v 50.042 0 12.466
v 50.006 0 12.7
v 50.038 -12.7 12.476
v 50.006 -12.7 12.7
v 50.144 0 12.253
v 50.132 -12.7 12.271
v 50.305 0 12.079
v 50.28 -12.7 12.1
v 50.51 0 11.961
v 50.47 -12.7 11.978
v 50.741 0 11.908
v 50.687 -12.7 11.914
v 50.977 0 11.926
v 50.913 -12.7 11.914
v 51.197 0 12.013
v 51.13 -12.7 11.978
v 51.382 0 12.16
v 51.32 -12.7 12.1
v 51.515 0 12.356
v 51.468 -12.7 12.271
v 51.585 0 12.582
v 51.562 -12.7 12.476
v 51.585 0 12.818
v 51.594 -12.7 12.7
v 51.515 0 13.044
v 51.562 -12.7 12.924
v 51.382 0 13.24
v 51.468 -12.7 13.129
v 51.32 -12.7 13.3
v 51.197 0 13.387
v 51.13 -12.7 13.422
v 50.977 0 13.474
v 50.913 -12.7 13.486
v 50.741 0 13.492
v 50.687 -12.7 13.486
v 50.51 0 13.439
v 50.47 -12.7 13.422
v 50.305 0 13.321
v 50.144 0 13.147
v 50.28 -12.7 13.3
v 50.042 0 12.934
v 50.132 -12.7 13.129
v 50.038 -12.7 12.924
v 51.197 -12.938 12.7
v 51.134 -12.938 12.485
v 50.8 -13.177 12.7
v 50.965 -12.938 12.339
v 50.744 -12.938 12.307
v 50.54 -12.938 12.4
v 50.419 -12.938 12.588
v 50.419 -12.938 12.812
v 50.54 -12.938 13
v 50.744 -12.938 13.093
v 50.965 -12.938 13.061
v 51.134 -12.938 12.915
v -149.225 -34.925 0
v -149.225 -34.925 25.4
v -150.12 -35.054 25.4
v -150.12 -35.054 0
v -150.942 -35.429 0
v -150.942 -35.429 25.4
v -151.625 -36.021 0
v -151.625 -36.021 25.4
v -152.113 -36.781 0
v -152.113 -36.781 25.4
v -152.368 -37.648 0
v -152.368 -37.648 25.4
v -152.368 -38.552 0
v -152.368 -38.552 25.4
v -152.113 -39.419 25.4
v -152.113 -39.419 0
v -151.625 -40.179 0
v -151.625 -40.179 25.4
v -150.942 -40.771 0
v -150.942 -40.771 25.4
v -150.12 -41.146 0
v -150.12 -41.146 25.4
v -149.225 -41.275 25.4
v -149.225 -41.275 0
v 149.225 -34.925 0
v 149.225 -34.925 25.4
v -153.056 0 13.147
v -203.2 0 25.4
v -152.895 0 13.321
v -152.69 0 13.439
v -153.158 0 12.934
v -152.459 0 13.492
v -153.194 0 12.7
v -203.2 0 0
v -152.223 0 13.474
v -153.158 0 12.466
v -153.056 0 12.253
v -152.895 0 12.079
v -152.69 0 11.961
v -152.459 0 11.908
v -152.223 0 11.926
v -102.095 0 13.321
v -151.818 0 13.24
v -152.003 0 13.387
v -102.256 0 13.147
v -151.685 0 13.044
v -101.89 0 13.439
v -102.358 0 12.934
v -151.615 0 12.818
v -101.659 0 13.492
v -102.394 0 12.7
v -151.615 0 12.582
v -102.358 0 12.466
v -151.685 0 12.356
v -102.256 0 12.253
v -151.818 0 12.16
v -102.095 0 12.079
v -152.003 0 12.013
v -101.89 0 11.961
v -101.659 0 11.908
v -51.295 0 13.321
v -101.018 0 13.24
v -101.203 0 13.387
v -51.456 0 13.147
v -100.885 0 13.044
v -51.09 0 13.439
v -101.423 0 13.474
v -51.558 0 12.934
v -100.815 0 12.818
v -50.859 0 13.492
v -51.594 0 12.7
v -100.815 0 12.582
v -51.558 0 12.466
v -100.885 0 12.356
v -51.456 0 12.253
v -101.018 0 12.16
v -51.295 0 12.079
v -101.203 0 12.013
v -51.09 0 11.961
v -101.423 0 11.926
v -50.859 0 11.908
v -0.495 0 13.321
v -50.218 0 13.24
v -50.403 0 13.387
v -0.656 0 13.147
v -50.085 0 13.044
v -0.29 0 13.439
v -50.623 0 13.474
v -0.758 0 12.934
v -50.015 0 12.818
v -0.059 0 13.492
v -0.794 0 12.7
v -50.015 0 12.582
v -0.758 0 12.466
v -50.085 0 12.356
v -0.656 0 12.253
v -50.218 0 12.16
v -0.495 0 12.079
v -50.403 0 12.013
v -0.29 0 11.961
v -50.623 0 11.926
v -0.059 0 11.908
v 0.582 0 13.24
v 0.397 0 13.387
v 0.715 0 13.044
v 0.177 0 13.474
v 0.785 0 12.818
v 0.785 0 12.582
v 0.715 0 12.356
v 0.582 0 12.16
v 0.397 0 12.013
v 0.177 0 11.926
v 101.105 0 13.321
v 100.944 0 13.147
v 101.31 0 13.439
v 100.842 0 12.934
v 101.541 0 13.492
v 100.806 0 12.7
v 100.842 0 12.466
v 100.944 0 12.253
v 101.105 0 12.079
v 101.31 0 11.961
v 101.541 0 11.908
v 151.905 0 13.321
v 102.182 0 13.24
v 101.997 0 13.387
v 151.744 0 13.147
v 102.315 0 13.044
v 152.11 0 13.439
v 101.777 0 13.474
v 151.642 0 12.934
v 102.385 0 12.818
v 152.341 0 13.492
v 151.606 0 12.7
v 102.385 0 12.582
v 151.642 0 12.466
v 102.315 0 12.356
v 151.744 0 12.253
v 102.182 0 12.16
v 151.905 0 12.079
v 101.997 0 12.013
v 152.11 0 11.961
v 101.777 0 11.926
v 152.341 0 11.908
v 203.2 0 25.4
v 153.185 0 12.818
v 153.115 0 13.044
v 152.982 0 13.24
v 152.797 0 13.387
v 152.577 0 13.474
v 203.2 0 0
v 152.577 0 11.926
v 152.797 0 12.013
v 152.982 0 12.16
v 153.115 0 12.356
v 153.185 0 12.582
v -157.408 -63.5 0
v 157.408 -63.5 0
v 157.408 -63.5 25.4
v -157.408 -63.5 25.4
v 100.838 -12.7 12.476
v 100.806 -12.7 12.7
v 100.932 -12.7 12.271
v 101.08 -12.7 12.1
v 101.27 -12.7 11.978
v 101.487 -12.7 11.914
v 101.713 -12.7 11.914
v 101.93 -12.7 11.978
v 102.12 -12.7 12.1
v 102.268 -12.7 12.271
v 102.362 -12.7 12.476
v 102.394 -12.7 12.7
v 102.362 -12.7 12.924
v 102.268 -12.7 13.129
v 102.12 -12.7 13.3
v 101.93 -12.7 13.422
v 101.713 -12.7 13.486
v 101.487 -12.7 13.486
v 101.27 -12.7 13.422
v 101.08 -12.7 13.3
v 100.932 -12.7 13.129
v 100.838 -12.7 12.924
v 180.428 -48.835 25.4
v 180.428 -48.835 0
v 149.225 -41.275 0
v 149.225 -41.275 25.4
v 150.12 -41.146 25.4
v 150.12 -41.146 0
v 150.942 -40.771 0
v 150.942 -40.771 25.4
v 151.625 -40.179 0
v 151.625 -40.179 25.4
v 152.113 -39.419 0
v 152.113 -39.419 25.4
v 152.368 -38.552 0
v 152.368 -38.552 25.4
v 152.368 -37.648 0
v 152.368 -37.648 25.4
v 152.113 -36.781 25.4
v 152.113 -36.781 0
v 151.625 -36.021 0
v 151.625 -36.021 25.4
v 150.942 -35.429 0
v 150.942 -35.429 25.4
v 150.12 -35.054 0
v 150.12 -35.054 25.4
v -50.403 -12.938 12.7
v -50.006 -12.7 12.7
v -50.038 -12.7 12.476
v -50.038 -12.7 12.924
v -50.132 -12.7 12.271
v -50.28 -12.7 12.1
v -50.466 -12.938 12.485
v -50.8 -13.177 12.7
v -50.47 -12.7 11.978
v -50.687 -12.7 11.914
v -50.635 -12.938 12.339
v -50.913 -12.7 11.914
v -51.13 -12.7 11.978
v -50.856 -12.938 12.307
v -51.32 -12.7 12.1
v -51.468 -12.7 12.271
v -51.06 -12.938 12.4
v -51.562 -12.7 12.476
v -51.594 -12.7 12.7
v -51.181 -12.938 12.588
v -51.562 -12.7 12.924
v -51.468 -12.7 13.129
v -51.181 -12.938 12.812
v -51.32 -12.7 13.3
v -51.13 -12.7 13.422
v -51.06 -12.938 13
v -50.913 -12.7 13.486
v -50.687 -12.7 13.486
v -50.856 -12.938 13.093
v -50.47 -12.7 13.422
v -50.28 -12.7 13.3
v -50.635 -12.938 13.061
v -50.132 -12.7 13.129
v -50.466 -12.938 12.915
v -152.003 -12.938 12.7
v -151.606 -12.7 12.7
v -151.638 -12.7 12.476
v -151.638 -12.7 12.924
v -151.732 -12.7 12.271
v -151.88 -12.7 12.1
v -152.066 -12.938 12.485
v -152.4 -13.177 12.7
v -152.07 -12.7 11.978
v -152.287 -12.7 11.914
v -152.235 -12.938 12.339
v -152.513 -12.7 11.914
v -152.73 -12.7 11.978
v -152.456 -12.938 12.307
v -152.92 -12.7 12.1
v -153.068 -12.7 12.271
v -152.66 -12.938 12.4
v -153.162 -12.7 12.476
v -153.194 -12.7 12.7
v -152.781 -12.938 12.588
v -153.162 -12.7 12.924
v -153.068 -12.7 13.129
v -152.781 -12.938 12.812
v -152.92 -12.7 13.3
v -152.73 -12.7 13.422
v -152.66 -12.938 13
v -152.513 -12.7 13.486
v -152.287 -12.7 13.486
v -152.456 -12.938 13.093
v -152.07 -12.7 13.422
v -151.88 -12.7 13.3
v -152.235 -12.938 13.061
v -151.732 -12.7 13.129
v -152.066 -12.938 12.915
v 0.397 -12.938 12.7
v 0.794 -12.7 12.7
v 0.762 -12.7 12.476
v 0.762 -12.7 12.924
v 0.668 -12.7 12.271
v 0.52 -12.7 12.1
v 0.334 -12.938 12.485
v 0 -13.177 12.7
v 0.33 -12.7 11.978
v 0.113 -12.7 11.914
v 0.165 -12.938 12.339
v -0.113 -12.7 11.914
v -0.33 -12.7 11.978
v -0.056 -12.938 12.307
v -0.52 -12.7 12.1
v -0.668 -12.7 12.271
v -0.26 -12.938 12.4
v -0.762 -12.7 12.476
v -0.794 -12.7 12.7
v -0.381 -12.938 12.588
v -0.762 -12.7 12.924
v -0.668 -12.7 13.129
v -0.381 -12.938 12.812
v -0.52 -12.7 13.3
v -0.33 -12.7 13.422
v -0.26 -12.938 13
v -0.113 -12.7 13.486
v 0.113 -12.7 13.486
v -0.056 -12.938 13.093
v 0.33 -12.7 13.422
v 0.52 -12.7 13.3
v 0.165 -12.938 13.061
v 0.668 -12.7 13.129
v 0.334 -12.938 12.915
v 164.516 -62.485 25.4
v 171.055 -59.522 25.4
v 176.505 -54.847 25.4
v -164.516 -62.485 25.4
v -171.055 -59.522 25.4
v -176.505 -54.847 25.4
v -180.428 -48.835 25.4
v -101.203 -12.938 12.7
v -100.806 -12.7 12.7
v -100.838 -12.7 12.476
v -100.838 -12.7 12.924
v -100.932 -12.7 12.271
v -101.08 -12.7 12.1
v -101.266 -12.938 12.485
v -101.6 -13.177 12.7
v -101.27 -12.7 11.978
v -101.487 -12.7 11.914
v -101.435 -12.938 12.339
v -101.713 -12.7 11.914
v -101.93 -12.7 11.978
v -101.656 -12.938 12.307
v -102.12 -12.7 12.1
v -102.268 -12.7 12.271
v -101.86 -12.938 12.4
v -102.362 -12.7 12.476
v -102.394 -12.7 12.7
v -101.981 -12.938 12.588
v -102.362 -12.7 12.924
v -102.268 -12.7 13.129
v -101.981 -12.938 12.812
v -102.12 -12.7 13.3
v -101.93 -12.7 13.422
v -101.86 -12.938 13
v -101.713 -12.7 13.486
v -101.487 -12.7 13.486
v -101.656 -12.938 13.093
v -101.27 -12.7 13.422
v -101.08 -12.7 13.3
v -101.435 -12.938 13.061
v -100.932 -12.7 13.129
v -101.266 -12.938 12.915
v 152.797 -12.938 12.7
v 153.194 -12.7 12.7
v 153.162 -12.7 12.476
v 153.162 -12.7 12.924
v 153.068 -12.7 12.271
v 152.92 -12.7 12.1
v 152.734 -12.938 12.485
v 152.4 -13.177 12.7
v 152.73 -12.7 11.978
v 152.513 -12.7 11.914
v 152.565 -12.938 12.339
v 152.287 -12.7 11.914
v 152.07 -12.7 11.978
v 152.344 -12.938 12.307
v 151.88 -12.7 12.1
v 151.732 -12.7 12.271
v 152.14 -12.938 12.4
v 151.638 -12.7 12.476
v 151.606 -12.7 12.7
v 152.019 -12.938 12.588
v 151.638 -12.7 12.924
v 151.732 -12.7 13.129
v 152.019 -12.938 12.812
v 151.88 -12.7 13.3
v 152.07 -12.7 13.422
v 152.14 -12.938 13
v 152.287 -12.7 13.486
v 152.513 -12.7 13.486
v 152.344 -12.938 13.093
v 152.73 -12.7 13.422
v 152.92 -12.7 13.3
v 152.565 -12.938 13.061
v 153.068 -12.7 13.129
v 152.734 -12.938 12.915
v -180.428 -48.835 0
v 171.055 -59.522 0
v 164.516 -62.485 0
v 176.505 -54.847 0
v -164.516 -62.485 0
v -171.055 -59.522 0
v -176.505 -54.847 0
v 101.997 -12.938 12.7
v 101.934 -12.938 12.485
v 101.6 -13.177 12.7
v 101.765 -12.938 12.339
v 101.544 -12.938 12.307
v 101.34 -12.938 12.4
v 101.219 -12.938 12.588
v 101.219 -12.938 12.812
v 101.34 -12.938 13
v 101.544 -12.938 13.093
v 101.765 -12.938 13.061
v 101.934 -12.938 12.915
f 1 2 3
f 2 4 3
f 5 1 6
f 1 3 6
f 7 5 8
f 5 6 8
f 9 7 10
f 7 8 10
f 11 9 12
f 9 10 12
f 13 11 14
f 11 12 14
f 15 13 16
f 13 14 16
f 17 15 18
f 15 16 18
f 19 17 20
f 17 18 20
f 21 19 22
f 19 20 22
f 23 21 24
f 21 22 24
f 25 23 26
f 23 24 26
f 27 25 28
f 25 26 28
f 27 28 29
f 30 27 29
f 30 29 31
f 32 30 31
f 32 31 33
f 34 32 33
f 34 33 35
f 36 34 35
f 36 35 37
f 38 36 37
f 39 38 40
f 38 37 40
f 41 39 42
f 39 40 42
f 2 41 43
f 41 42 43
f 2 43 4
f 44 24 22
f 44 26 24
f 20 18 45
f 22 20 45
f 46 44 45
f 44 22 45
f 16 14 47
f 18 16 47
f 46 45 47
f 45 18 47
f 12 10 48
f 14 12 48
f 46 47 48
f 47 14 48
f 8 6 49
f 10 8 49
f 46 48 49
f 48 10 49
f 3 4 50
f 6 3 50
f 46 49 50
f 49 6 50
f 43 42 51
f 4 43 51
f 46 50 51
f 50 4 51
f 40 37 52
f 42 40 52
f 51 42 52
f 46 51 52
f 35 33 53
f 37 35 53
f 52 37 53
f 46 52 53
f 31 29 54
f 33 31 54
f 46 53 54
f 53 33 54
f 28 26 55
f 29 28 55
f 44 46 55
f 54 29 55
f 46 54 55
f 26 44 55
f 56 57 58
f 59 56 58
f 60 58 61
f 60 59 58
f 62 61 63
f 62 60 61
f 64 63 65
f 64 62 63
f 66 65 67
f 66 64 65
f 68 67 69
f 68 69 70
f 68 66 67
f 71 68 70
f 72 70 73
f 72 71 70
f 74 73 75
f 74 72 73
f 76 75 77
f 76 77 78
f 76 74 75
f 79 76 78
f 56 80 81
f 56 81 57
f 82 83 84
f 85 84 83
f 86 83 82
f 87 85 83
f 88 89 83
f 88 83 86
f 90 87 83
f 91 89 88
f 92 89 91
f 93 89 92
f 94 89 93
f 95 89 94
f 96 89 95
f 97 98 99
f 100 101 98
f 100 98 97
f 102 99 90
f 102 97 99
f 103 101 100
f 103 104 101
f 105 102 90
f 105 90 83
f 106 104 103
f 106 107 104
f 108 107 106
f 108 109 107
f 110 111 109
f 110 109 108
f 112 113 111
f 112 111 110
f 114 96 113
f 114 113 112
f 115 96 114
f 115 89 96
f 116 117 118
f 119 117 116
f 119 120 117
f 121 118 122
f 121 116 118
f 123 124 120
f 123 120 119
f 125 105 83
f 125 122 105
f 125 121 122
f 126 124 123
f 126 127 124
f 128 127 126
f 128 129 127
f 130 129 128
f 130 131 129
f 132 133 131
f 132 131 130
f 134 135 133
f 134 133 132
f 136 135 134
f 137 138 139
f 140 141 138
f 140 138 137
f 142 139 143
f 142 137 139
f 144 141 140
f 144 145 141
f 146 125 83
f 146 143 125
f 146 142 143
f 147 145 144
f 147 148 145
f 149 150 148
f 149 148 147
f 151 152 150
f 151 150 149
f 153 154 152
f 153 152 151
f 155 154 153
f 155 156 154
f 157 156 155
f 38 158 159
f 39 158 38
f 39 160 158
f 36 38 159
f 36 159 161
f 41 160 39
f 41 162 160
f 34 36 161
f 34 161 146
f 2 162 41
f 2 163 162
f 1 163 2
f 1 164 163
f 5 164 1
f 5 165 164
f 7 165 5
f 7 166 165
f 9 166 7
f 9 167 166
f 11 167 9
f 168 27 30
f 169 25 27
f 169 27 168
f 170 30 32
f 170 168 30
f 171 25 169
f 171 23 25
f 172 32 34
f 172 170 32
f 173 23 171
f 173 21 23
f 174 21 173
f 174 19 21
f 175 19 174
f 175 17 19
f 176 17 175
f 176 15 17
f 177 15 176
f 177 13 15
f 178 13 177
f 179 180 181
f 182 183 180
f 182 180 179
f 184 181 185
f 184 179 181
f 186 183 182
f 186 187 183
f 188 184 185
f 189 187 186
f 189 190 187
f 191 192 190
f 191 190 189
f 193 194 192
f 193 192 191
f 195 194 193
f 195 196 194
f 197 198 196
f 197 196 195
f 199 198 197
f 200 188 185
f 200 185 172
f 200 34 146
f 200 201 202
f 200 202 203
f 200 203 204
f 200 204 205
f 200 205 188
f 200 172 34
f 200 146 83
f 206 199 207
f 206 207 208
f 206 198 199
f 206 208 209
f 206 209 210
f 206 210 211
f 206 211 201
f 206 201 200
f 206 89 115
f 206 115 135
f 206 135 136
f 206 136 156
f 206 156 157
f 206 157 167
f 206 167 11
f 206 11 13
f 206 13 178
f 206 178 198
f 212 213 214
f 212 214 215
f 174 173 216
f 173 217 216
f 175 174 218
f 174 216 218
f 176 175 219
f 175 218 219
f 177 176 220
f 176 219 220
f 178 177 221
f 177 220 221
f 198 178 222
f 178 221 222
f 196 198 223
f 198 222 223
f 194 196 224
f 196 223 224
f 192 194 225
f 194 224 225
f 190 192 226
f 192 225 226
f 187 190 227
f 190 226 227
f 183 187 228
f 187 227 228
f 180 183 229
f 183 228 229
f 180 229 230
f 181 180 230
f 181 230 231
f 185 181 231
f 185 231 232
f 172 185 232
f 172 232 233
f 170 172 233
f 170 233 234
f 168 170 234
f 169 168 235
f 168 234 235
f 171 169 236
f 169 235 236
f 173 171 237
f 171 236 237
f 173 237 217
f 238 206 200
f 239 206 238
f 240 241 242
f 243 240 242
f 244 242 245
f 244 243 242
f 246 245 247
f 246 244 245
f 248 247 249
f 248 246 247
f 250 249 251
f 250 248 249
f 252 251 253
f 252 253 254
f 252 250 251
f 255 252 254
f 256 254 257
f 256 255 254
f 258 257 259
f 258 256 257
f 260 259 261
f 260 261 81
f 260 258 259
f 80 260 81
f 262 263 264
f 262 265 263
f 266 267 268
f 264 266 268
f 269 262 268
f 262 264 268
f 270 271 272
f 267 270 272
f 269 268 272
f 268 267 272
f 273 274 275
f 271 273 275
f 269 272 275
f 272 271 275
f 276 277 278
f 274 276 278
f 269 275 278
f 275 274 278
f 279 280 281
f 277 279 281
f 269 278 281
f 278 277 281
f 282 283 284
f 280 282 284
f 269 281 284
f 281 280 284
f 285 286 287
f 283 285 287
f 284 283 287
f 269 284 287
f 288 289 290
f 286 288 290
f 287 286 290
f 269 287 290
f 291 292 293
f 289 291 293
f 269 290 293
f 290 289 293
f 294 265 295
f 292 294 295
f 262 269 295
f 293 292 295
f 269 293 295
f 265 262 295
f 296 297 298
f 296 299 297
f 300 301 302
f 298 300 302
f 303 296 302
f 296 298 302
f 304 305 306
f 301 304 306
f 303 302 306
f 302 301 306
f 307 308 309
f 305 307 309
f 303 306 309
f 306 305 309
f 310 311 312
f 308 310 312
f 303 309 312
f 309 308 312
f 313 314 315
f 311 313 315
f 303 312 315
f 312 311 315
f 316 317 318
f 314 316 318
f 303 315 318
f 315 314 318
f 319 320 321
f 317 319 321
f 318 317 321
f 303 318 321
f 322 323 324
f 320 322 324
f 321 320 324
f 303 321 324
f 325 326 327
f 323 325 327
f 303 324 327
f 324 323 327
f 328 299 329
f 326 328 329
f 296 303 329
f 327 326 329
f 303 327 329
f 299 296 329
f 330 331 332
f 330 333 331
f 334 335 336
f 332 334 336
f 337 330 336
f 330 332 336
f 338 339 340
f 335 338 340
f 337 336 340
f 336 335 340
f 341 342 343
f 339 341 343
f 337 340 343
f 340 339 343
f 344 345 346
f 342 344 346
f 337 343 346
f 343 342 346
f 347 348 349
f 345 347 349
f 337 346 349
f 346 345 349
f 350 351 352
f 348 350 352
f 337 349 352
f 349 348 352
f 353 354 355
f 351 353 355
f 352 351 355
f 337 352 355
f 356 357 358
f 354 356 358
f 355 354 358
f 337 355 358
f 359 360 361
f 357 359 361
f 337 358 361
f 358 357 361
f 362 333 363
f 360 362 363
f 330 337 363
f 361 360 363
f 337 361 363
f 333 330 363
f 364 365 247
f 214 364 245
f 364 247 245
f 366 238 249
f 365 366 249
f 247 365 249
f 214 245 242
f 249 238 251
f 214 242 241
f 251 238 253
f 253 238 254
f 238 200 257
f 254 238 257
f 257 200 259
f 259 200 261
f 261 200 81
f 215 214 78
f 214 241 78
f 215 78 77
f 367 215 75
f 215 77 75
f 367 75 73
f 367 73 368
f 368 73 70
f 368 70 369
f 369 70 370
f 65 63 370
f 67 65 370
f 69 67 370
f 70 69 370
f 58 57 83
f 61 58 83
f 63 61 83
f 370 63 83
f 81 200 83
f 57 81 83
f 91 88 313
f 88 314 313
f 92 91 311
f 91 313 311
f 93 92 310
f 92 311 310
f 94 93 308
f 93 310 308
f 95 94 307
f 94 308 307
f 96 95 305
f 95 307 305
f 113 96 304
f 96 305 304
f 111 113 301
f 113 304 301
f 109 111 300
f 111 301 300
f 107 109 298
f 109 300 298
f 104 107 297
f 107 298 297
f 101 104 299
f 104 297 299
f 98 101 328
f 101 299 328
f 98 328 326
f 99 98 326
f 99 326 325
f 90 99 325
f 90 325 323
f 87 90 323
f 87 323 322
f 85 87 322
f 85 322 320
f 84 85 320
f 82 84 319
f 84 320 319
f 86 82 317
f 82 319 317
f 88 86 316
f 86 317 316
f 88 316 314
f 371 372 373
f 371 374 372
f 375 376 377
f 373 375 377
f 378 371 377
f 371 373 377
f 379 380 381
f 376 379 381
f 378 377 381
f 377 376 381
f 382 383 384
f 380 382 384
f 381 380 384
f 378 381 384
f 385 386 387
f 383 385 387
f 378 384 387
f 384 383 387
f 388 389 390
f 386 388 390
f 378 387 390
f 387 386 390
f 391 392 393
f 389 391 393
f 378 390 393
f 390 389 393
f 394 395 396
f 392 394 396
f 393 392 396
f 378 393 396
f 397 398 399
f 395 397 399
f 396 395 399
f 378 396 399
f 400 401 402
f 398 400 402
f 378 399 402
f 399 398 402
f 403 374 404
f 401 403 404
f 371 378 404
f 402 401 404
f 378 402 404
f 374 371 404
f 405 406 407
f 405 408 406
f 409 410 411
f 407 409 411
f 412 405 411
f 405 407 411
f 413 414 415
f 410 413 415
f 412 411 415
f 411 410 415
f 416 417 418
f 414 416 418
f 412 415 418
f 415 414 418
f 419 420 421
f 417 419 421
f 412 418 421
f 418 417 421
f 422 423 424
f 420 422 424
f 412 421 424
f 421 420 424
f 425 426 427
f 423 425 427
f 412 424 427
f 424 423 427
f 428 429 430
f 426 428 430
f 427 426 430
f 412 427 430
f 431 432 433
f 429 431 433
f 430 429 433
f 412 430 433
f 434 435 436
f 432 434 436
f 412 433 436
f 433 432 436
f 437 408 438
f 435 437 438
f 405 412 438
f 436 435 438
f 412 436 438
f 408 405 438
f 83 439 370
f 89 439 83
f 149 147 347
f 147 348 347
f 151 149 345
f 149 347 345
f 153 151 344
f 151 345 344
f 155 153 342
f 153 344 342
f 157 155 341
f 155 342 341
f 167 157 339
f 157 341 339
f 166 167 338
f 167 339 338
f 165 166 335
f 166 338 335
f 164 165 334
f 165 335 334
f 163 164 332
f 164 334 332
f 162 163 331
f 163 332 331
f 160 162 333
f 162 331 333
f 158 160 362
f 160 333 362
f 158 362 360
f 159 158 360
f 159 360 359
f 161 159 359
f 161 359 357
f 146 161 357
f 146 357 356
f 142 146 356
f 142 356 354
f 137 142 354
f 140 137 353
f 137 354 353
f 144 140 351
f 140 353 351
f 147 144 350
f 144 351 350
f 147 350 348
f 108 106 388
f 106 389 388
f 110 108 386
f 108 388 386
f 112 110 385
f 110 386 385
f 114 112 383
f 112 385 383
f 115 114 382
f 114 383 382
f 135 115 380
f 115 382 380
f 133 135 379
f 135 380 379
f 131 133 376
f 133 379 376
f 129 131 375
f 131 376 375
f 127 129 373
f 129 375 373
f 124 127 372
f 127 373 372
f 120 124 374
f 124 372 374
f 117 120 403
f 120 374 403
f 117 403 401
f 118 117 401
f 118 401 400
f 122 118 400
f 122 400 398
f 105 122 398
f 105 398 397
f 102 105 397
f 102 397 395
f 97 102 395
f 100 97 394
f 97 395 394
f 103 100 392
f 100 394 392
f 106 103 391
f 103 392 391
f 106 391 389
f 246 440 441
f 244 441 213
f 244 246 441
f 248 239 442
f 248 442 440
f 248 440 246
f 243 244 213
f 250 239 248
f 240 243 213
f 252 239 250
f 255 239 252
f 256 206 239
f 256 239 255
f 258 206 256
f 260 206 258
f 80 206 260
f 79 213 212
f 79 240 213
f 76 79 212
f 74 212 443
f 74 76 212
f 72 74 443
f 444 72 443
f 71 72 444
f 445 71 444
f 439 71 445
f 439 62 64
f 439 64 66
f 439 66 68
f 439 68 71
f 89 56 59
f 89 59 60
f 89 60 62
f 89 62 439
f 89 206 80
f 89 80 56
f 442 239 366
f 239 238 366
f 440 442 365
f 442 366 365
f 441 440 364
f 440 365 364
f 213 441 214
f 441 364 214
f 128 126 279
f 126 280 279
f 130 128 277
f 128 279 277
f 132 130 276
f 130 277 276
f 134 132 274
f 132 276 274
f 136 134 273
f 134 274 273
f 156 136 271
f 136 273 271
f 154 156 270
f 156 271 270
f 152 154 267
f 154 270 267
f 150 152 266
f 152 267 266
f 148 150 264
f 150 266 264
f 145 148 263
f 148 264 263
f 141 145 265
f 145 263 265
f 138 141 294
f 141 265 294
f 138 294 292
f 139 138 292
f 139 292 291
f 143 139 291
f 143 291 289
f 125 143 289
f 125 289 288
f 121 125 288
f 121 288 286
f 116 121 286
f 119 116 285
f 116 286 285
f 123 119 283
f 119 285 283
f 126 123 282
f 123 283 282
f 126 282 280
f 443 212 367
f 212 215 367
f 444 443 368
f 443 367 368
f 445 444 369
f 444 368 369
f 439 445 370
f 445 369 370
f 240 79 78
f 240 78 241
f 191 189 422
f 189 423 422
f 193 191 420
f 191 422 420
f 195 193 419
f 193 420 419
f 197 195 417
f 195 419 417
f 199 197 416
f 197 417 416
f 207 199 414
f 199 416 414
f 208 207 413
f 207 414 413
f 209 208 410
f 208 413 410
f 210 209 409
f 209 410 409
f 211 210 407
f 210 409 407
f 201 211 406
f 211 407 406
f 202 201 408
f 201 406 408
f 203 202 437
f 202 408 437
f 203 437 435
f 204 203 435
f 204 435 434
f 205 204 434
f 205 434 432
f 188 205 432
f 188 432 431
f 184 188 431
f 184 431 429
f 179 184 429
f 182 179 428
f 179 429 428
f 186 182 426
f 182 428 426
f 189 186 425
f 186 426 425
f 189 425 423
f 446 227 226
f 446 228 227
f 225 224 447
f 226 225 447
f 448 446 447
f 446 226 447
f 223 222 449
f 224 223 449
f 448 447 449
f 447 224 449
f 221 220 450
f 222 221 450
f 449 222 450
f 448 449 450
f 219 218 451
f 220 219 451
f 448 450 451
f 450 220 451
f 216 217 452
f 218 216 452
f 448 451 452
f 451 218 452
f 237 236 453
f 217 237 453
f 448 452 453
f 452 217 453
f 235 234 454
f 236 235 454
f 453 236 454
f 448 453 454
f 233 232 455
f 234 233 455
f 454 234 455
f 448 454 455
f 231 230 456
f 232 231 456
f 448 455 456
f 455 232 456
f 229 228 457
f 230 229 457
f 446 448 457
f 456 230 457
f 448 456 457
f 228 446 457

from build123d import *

# Parameters (mm, degrees)
BOSS_EXTRUDE1_DEPTH                = 25.4
FILLET1_R                          = 25.4
F_1_4_0_25_DIAMETER_SLOT1_DEPTH    = 25.4
F_1_16_0_0625_DIAMETER_HOLE1_D     = 1.5875
F_1_16_0_0625_DIAMETER_HOLE1_DEPTH = 12.7
F_1_16_0_0625_DIAMETER_HOLE1_TIP   = 0.476933116


# Read off the part's stored shape, not the designer's step: 1/4 (0.25) Diameter Slot1
with BuildPart() as part:
    # Sketch1 → Boss-Extrude1 (new body)
    with BuildSketch(Plane.XY):
        Polygon((-203.2, 0), (203.2, 0), (173.589463707, -63.5), (-173.589463707, -63.5), align=None)
    extrude(amount=BOSS_EXTRUDE1_DEPTH)

    # Fillet1
    fillet1_edges = [part.edges().sort_by_distance(p)[0] for p in [
        (173.589463707, -63.5, 12.7),
        (-173.589463707, -63.5, 12.7),
    ]]
    fillet(fillet1_edges, radius=FILLET1_R)

    # 1/4 (0.25) Diameter Slot1 outline → 1/4 (0.25) Diameter Slot1 (cut)
    with BuildSketch(Plane.XY):
        with BuildLine():
            Line((-149.225, -41.275), (149.225, -41.275))
            ThreePointArc((149.225, -41.275), (152.4, -38.1), (149.225, -34.925))
            Line((149.225, -34.925), (-149.225, -34.925))
            ThreePointArc((-149.225, -34.925), (-152.4, -38.1), (-149.225, -41.275))
        make_face()
    extrude(amount=F_1_4_0_25_DIAMETER_SLOT1_DEPTH, mode=Mode.SUBTRACT)

    # 1/16 (0.0625) Diameter Hole1
    with Locations(Plane(origin=(0, 0, 0), x_dir=(1, 0, 0), z_dir=(0, 1, 0))):
        with Locations((-152.4, -12.7), (-101.6, -12.7), (-50.8, -12.7), (0, -12.7), (50.8, -12.7), (101.6, -12.7), (152.4, -12.7)):
            Hole(F_1_16_0_0625_DIAMETER_HOLE1_D / 2, depth=F_1_16_0_0625_DIAMETER_HOLE1_DEPTH)
            with Locations((0, 0, -(F_1_16_0_0625_DIAMETER_HOLE1_DEPTH + F_1_16_0_0625_DIAMETER_HOLE1_TIP / 2))):  # 118° drill point
                Cone(0, F_1_16_0_0625_DIAMETER_HOLE1_D / 2, F_1_16_0_0625_DIAMETER_HOLE1_TIP, mode=Mode.SUBTRACT)


solid = part.part
